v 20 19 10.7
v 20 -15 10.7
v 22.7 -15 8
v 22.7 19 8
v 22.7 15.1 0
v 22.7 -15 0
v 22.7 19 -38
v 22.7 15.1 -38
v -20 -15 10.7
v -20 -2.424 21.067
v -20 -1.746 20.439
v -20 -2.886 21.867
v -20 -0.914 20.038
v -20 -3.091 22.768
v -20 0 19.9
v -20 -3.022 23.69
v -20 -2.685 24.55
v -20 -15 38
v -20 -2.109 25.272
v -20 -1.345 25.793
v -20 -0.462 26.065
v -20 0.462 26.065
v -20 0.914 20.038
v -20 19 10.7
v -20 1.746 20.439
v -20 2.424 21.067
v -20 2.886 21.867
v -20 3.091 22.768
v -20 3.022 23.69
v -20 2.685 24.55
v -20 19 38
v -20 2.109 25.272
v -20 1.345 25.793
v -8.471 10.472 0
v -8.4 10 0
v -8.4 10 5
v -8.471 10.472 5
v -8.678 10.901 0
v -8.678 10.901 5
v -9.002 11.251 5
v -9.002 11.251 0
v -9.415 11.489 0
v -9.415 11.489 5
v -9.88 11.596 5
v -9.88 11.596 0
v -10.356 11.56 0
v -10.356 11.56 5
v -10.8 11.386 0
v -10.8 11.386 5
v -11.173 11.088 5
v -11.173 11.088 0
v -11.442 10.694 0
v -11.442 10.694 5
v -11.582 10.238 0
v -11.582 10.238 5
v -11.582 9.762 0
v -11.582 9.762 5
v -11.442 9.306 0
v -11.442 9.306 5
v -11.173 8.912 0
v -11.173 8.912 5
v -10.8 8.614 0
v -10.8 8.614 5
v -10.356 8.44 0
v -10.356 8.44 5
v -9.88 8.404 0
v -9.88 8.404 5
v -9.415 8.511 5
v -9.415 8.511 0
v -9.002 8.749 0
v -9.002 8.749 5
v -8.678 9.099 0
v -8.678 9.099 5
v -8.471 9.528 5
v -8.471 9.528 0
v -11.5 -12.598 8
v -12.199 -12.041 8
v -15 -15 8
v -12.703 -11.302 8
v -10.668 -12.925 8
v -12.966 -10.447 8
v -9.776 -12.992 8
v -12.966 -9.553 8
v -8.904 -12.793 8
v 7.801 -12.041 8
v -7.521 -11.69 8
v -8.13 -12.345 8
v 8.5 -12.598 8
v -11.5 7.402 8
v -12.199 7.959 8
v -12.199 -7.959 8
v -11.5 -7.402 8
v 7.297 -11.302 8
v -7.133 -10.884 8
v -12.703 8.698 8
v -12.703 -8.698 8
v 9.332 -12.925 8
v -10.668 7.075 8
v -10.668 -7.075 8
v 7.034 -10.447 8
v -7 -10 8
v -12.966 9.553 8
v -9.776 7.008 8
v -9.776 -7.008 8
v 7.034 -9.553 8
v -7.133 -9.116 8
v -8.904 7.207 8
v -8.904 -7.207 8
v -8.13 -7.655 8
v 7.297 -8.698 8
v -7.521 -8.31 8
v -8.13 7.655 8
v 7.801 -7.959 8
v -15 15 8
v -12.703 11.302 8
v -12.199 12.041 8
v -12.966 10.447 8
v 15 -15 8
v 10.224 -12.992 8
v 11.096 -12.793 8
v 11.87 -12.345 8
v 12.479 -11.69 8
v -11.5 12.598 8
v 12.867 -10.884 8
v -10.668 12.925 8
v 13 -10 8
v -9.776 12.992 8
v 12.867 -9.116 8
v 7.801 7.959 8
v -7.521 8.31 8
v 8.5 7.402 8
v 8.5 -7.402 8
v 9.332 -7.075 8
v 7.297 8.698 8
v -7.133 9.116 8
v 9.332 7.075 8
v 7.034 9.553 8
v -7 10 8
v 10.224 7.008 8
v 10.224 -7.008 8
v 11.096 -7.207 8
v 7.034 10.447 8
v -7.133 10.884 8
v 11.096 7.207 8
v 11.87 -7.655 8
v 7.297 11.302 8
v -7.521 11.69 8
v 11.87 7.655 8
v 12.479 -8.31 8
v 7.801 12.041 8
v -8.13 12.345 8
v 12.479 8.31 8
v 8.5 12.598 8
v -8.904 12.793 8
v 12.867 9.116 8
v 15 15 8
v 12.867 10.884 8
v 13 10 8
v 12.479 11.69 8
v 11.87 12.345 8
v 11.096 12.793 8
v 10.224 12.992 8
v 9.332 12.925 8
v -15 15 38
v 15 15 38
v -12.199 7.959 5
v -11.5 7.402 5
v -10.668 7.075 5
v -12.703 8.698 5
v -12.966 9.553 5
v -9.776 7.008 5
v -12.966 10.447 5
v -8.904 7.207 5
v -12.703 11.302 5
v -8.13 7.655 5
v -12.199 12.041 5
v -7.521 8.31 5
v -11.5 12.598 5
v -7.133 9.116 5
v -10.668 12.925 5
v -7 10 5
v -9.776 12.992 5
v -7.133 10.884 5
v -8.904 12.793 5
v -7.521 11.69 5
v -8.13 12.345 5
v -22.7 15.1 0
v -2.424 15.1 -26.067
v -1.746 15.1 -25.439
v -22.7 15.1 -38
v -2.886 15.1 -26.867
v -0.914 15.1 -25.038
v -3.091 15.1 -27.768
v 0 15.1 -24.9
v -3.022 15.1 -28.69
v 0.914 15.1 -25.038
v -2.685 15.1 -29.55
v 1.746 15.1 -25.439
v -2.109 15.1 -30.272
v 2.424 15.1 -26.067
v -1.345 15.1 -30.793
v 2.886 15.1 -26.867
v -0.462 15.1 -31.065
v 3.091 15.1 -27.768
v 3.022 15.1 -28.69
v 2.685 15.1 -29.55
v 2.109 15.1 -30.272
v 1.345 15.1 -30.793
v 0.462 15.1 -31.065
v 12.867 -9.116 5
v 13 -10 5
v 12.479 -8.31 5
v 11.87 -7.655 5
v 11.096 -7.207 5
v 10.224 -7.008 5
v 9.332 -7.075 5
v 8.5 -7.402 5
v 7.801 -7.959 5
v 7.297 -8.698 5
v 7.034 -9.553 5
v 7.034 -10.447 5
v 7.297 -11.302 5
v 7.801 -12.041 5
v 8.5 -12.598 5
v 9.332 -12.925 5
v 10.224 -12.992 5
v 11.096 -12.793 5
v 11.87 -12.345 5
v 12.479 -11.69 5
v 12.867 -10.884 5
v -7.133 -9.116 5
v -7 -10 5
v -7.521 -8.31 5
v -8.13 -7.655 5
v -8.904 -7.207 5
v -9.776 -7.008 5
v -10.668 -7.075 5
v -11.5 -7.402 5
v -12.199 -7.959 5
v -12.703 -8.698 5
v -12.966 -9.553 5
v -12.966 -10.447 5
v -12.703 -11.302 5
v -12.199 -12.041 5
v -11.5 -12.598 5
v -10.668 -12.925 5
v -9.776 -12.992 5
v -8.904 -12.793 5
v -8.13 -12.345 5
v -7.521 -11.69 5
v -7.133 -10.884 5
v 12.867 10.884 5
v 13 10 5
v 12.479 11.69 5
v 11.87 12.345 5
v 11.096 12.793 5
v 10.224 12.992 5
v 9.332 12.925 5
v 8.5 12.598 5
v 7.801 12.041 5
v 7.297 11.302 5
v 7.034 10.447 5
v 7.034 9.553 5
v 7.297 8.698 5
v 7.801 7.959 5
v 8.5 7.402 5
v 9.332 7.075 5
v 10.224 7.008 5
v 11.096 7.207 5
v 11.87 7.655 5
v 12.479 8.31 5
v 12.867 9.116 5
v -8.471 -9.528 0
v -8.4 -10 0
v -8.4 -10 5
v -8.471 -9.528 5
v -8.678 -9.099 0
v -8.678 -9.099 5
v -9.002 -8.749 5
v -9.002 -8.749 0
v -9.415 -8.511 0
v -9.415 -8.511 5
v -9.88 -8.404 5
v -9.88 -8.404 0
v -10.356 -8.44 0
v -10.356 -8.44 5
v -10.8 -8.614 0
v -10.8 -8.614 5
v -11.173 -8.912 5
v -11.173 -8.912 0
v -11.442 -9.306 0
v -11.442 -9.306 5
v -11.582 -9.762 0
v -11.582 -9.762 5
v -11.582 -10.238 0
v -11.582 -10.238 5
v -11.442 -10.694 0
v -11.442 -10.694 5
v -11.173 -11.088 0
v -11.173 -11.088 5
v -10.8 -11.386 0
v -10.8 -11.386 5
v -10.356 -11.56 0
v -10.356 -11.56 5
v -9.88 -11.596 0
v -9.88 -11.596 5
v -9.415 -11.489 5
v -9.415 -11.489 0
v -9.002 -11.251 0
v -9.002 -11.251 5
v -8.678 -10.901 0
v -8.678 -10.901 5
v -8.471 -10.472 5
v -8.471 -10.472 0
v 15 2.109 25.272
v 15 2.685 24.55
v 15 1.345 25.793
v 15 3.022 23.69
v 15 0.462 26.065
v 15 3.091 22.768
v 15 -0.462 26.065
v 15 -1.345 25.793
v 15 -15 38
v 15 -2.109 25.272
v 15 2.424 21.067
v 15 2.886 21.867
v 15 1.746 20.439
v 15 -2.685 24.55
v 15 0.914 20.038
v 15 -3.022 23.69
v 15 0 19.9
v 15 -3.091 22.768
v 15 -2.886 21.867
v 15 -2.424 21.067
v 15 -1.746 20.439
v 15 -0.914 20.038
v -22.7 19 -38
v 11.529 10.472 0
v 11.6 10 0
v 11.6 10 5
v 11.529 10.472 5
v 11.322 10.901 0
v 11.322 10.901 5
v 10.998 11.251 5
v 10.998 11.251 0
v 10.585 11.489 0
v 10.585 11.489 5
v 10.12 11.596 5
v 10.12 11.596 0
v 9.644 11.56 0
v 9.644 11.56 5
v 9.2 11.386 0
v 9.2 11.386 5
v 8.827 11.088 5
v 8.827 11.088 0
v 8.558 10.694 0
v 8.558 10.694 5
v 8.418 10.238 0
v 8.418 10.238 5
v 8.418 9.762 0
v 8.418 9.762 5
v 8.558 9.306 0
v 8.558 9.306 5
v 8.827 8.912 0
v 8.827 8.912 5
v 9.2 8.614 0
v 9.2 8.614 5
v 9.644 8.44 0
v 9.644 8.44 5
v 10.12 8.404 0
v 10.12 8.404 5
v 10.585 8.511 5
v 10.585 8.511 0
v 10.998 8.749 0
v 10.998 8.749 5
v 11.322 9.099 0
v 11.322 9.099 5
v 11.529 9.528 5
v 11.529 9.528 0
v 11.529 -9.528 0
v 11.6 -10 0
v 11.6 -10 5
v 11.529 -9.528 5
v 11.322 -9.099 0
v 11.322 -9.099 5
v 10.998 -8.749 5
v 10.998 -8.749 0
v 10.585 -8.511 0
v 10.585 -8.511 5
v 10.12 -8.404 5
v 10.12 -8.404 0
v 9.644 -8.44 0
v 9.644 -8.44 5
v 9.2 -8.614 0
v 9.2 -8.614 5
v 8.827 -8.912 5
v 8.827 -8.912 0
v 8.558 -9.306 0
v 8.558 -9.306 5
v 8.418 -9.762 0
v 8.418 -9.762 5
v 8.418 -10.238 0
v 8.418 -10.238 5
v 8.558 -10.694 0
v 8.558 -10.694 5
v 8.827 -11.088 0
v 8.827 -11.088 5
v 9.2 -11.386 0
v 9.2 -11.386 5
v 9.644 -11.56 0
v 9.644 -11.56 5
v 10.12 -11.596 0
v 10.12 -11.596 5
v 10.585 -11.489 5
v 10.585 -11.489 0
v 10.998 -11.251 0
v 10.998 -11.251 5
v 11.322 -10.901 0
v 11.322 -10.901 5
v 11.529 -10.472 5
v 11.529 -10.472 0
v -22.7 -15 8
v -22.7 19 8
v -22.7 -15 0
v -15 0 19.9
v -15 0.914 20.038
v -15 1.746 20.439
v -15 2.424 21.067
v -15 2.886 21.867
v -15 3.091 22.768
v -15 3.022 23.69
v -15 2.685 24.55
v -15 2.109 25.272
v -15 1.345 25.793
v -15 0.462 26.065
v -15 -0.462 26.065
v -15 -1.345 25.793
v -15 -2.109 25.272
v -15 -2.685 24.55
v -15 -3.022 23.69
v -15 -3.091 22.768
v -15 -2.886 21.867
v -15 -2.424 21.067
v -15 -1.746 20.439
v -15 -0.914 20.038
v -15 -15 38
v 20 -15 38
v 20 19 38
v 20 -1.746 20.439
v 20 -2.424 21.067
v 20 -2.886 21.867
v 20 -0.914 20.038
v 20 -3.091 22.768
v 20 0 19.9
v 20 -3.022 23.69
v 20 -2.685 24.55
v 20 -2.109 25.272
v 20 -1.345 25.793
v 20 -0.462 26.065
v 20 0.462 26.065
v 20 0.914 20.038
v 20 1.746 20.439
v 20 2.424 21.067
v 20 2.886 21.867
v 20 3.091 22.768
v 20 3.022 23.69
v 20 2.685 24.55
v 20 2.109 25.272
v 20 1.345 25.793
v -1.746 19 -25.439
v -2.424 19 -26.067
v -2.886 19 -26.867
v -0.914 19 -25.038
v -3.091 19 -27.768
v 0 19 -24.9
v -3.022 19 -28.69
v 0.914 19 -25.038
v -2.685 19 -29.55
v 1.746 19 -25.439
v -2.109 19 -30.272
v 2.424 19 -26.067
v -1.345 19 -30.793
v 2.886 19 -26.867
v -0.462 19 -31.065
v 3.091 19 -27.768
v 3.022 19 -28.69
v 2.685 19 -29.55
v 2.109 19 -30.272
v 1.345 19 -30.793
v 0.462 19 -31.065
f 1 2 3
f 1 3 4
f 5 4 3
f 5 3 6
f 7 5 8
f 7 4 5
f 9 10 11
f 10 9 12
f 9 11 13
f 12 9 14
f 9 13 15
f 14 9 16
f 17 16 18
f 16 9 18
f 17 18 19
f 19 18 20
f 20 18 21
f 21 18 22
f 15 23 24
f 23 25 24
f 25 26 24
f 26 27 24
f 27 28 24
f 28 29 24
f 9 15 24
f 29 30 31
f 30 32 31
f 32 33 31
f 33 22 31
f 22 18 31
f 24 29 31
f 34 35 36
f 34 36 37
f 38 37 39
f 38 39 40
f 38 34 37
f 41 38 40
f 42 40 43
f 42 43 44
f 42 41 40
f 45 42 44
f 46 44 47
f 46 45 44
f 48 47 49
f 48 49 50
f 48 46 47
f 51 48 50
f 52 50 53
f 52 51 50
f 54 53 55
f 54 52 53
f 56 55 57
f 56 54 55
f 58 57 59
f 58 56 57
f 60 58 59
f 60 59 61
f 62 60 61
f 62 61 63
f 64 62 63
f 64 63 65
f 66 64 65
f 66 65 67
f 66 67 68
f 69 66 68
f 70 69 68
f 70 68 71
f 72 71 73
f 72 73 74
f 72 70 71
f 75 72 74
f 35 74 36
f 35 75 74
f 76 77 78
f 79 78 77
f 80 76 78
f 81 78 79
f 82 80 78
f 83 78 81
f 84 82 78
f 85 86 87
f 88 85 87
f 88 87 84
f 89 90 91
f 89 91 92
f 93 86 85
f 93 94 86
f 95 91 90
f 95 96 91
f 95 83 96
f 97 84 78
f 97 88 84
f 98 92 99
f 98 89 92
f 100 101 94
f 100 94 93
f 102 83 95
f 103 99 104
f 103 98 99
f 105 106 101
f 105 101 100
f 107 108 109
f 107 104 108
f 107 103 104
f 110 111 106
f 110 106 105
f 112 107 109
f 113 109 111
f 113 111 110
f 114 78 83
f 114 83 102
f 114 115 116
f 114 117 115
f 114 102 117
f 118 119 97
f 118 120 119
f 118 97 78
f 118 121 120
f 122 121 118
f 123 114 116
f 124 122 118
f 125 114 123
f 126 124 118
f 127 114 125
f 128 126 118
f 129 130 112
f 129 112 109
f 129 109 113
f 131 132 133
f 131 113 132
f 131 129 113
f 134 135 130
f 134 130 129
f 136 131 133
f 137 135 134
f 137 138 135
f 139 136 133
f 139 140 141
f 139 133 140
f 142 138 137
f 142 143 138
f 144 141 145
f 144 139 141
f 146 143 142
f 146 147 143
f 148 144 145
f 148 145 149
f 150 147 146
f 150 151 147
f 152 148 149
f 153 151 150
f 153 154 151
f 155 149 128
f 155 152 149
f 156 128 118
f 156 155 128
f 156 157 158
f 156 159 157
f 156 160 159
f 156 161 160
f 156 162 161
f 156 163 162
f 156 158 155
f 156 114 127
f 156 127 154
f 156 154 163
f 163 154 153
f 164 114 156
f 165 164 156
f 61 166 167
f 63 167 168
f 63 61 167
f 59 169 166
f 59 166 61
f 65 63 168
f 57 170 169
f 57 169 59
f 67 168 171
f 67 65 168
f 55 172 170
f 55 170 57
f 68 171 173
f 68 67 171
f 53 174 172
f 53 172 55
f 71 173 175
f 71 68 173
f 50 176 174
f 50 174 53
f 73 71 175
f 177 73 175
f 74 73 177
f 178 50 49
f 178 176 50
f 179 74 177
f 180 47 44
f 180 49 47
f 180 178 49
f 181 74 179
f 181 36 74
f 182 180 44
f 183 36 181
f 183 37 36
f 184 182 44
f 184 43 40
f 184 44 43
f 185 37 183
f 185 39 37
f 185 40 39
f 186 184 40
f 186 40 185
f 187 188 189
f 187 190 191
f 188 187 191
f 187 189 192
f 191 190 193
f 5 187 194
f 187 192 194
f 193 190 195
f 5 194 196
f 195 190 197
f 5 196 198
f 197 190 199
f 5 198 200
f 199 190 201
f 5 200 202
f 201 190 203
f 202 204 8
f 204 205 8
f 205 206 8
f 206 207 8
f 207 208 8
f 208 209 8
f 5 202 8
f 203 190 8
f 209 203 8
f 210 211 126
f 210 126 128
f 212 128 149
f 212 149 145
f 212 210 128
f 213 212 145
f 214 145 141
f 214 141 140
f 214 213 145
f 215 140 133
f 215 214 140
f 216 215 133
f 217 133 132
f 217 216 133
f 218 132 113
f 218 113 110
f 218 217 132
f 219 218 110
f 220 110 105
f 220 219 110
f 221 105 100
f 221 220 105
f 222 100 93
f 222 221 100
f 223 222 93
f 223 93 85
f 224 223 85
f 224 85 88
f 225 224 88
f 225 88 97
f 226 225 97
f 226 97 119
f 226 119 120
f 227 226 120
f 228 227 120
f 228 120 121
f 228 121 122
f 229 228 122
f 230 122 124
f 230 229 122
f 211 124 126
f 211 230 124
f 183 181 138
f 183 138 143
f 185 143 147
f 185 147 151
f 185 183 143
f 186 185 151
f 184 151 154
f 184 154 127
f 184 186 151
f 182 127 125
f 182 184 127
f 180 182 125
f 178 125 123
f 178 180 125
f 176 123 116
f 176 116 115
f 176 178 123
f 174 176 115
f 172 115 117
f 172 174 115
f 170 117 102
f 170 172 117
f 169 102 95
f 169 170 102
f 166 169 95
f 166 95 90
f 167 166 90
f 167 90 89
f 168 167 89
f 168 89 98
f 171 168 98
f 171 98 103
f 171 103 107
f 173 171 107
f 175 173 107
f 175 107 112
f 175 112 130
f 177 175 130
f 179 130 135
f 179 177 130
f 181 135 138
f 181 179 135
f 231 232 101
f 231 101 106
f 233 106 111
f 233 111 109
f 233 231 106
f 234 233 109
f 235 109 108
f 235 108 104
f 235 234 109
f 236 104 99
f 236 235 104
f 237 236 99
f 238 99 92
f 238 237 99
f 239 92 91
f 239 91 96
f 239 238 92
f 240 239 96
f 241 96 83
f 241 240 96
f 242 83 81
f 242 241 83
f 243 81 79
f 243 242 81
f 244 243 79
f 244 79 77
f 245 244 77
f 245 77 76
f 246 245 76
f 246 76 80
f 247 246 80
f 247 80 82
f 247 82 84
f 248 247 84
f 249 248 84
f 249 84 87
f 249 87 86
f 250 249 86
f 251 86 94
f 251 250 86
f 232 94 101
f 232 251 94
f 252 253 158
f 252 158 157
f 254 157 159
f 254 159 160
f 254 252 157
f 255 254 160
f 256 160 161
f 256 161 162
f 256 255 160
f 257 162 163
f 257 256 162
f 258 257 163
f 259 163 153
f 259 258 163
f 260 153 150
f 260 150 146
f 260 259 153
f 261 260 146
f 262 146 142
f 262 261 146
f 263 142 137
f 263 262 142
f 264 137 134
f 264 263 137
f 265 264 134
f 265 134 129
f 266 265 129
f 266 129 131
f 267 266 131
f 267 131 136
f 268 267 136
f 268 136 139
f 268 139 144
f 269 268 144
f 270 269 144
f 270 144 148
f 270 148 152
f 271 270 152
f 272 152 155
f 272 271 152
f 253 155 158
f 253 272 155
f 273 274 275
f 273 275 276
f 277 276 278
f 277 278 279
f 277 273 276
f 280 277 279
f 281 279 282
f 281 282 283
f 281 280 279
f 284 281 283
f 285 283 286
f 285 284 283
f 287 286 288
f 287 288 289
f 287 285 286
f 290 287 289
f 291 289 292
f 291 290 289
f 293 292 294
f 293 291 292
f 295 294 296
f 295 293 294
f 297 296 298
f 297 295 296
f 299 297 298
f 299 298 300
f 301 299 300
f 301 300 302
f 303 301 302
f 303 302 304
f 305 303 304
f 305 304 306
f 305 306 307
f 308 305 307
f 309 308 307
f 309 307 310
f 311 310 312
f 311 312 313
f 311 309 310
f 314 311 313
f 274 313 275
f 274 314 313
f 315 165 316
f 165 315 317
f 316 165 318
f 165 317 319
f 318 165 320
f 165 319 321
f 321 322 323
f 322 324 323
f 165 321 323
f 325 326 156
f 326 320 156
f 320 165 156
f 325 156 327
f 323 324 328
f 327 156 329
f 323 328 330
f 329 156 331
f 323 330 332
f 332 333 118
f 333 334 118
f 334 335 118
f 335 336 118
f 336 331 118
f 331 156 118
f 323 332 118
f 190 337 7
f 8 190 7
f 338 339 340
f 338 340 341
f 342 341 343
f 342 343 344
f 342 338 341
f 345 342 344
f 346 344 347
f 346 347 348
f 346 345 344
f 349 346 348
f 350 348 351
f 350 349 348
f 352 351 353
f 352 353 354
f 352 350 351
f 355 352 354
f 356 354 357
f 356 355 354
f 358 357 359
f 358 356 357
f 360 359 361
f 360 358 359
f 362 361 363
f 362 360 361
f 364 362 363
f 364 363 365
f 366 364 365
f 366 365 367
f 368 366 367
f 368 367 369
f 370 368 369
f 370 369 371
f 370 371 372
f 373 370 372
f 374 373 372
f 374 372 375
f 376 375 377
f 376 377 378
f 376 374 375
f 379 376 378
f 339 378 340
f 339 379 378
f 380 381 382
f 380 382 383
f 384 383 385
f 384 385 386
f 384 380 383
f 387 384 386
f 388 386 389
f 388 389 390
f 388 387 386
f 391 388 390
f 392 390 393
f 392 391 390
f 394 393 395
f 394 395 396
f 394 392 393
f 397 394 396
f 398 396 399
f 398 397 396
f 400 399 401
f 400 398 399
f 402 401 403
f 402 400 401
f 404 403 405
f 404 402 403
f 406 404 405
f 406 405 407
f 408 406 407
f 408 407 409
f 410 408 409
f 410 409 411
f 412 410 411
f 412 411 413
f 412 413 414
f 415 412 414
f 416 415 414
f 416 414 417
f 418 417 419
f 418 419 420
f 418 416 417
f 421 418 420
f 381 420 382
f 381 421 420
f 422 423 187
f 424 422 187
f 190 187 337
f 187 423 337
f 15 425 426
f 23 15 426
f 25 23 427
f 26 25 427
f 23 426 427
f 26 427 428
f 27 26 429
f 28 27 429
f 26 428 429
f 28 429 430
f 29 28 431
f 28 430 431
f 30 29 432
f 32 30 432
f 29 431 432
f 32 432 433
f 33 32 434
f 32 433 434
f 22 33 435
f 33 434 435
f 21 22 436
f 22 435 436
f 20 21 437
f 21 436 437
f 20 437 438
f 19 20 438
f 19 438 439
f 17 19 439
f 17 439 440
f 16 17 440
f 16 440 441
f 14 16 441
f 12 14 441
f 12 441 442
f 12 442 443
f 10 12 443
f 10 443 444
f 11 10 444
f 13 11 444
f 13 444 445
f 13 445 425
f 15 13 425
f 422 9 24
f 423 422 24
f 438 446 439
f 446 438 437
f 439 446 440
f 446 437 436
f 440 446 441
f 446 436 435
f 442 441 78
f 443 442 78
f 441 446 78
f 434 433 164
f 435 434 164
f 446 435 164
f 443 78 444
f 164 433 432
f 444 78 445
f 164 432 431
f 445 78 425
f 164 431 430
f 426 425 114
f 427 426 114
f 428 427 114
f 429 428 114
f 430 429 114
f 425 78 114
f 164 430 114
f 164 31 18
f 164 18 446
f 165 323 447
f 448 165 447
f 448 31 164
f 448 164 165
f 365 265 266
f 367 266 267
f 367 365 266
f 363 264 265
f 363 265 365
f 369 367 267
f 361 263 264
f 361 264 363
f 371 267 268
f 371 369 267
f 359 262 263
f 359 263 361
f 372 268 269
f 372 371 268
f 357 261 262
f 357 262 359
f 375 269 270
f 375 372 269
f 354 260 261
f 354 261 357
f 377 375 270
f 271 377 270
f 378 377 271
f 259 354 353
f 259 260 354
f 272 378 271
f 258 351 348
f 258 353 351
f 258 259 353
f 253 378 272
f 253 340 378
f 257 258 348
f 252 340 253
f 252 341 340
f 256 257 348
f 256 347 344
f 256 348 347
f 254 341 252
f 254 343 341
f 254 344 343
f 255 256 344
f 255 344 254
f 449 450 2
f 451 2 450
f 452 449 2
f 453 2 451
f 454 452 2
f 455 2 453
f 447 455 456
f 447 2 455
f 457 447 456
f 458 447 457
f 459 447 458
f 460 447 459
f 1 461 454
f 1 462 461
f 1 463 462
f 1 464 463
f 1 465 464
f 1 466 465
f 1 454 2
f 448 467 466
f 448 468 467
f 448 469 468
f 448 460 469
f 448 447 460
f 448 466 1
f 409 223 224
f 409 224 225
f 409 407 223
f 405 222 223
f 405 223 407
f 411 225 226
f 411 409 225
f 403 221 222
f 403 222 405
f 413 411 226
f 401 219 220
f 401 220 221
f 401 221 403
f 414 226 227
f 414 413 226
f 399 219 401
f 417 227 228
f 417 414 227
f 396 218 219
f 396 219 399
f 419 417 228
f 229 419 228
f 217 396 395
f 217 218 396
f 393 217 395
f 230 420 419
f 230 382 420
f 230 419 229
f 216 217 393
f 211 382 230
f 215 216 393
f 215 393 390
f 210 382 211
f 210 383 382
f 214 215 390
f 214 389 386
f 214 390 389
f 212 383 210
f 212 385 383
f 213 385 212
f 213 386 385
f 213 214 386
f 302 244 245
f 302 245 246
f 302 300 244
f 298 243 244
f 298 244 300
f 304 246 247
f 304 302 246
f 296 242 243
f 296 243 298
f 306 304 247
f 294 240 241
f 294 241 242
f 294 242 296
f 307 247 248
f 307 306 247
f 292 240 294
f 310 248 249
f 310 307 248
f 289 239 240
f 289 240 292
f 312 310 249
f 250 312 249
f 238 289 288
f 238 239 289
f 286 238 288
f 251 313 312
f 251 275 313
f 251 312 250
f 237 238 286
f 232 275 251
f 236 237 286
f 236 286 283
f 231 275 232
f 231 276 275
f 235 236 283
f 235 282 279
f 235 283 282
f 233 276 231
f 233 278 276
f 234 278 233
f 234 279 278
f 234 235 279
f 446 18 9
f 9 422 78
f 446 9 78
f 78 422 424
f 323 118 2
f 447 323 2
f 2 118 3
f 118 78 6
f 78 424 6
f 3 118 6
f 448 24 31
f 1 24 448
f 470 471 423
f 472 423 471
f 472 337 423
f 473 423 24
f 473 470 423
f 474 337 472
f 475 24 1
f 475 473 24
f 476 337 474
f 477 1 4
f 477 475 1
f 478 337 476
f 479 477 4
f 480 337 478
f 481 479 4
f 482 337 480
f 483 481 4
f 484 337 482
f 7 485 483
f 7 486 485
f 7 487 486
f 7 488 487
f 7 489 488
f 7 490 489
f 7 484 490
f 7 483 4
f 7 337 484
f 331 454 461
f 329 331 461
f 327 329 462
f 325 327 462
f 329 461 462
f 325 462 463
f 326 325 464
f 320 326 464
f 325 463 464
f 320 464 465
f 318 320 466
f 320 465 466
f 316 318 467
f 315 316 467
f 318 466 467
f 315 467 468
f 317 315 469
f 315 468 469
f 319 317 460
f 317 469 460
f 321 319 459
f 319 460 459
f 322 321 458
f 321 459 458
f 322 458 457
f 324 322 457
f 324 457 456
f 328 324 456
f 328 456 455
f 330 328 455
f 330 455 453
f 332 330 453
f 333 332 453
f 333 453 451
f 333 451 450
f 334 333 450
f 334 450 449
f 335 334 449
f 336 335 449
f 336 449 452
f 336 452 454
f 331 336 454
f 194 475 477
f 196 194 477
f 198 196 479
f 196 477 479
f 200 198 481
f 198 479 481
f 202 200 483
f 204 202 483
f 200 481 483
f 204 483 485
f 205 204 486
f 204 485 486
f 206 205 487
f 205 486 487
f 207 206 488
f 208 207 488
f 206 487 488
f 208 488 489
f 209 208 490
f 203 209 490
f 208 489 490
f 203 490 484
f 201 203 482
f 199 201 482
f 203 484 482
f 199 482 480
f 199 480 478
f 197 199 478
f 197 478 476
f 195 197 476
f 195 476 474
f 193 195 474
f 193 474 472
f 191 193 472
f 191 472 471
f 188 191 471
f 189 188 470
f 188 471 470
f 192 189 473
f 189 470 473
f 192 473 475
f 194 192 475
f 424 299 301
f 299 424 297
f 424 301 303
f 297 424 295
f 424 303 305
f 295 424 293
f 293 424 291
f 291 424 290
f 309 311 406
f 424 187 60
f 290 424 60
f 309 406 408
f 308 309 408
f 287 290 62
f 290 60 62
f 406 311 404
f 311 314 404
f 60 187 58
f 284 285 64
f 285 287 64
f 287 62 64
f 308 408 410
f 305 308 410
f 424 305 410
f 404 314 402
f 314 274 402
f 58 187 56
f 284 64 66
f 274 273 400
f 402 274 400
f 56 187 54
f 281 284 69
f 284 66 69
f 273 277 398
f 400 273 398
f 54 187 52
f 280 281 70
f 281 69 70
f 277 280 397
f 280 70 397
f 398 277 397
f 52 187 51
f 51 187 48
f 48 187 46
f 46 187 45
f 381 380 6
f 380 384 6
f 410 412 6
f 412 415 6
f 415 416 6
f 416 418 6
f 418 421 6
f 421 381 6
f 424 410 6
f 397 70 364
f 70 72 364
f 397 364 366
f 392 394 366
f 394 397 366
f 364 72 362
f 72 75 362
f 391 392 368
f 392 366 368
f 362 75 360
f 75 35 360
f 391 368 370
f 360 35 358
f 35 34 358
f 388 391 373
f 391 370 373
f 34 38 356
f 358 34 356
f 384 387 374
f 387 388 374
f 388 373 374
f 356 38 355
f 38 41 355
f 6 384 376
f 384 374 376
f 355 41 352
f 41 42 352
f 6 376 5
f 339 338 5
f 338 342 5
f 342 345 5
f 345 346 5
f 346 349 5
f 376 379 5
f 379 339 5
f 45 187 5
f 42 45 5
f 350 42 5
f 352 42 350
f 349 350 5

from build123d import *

# Parameters (mm, degrees)
SKETCH1_R           = 1.6
BOSS_EXTRUDE1_DEPTH = 5
SKETCH3_W           = 45.4
SKETCH3_H           = 34
SKETCH3_R           = 3
BOSS_EXTRUDE2_DEPTH = 3
BOSS_EXTRUDE3_DEPTH = 30
SKETCH5_R           = 3.1
CUT_EXTRUDE2_DEPTH  = 63.178452859
SKETCH6_W           = 45.4
SKETCH6_H           = 38
SKETCH6_R           = 3.1
BOSS_EXTRUDE4_DEPTH = 3.9
SKETCH9_W           = 2.7
SKETCH9_H           = 34
CUT_EXTRUDE3_DEPTH  = 30
CHAMFER1_SIZE       = 2.7


with BuildPart() as part:
    # Sketch1 → Boss-Extrude1 (new body)
    with BuildSketch(Plane.XY):
        Polygon((22.7, 15), (22.7, 19), (-22.7, 19), (-22.7, 15), (-22.7, -15), (22.7, -15), align=None)
        with Locations((-10, 10)):
            Circle(SKETCH1_R, mode=Mode.SUBTRACT)
        with Locations((10, 10)):
            Circle(SKETCH1_R, mode=Mode.SUBTRACT)
        with Locations((10, -10)):
            Circle(SKETCH1_R, mode=Mode.SUBTRACT)
        with Locations((-10, -10)):
            Circle(SKETCH1_R, mode=Mode.SUBTRACT)
    extrude(amount=BOSS_EXTRUDE1_DEPTH)

    # Sketch3 → Boss-Extrude2 (add)
    with BuildSketch(Plane.XY.offset(5)):
        with Locations((0, 2)):
            Rectangle(SKETCH3_W, SKETCH3_H)
        with Locations((10, -10)):
            Circle(SKETCH3_R, mode=Mode.SUBTRACT)
        with Locations((10, 10)):
            Circle(SKETCH3_R, mode=Mode.SUBTRACT)
        with Locations((-10, 10)):
            Circle(SKETCH3_R, mode=Mode.SUBTRACT)
        with Locations((-10, -10)):
            Circle(SKETCH3_R, mode=Mode.SUBTRACT)
    extrude(amount=BOSS_EXTRUDE2_DEPTH)

    # Sketch2 → Boss-Extrude3 (add)
    with BuildSketch(Plane.XY.offset(8)):
        Polygon((15, 15), (15, -15), (22.7, -15), (22.7, 19), (-22.7, 19), (-22.7, -15), (-15, -15), (-15, 15), align=None)
    extrude(amount=BOSS_EXTRUDE3_DEPTH)

    # Sketch5 → Cut-Extrude2 (cut, through all)
    with BuildSketch(Plane(origin=(22.7, 0, 0), x_dir=(0, 0, -1), z_dir=(1, 0, 0))):
        with Locations((-23, 0)):
            Circle(SKETCH5_R)
    extrude(amount=-CUT_EXTRUDE2_DEPTH, mode=Mode.SUBTRACT)

    # Sketch6 → Boss-Extrude4 (add)
    with BuildSketch(Plane(origin=(0, 19, 0), x_dir=(1, 0, 0), z_dir=(0, 1, 0))):
        with Locations((0, 19)):
            Rectangle(SKETCH6_W, SKETCH6_H)
        with Locations(Location((0, 28, 0), (0, 0, 270))):
            Circle(SKETCH6_R, mode=Mode.SUBTRACT)
    extrude(amount=-BOSS_EXTRUDE4_DEPTH)

    # Sketch9 → Cut-Extrude3 (cut)
    with BuildSketch(Plane.XY.offset(38)):
        with Locations((-21.35, 2)):
            Rectangle(SKETCH9_W, SKETCH9_H)
        with Locations((21.35, 2)):
            Rectangle(SKETCH9_W, SKETCH9_H)
    extrude(amount=-CUT_EXTRUDE3_DEPTH, mode=Mode.SUBTRACT)

    # Chamfer1
    chamfer1_edges = [part.edges().sort_by_distance(p)[0] for p in [
        (20, 2, 8),
        (-20, 2, 8),
    ]]
    chamfer(chamfer1_edges, length=CHAMFER1_SIZE - 0.0001)  # a hair under: the kernel refuses the full size


solid = part.part
